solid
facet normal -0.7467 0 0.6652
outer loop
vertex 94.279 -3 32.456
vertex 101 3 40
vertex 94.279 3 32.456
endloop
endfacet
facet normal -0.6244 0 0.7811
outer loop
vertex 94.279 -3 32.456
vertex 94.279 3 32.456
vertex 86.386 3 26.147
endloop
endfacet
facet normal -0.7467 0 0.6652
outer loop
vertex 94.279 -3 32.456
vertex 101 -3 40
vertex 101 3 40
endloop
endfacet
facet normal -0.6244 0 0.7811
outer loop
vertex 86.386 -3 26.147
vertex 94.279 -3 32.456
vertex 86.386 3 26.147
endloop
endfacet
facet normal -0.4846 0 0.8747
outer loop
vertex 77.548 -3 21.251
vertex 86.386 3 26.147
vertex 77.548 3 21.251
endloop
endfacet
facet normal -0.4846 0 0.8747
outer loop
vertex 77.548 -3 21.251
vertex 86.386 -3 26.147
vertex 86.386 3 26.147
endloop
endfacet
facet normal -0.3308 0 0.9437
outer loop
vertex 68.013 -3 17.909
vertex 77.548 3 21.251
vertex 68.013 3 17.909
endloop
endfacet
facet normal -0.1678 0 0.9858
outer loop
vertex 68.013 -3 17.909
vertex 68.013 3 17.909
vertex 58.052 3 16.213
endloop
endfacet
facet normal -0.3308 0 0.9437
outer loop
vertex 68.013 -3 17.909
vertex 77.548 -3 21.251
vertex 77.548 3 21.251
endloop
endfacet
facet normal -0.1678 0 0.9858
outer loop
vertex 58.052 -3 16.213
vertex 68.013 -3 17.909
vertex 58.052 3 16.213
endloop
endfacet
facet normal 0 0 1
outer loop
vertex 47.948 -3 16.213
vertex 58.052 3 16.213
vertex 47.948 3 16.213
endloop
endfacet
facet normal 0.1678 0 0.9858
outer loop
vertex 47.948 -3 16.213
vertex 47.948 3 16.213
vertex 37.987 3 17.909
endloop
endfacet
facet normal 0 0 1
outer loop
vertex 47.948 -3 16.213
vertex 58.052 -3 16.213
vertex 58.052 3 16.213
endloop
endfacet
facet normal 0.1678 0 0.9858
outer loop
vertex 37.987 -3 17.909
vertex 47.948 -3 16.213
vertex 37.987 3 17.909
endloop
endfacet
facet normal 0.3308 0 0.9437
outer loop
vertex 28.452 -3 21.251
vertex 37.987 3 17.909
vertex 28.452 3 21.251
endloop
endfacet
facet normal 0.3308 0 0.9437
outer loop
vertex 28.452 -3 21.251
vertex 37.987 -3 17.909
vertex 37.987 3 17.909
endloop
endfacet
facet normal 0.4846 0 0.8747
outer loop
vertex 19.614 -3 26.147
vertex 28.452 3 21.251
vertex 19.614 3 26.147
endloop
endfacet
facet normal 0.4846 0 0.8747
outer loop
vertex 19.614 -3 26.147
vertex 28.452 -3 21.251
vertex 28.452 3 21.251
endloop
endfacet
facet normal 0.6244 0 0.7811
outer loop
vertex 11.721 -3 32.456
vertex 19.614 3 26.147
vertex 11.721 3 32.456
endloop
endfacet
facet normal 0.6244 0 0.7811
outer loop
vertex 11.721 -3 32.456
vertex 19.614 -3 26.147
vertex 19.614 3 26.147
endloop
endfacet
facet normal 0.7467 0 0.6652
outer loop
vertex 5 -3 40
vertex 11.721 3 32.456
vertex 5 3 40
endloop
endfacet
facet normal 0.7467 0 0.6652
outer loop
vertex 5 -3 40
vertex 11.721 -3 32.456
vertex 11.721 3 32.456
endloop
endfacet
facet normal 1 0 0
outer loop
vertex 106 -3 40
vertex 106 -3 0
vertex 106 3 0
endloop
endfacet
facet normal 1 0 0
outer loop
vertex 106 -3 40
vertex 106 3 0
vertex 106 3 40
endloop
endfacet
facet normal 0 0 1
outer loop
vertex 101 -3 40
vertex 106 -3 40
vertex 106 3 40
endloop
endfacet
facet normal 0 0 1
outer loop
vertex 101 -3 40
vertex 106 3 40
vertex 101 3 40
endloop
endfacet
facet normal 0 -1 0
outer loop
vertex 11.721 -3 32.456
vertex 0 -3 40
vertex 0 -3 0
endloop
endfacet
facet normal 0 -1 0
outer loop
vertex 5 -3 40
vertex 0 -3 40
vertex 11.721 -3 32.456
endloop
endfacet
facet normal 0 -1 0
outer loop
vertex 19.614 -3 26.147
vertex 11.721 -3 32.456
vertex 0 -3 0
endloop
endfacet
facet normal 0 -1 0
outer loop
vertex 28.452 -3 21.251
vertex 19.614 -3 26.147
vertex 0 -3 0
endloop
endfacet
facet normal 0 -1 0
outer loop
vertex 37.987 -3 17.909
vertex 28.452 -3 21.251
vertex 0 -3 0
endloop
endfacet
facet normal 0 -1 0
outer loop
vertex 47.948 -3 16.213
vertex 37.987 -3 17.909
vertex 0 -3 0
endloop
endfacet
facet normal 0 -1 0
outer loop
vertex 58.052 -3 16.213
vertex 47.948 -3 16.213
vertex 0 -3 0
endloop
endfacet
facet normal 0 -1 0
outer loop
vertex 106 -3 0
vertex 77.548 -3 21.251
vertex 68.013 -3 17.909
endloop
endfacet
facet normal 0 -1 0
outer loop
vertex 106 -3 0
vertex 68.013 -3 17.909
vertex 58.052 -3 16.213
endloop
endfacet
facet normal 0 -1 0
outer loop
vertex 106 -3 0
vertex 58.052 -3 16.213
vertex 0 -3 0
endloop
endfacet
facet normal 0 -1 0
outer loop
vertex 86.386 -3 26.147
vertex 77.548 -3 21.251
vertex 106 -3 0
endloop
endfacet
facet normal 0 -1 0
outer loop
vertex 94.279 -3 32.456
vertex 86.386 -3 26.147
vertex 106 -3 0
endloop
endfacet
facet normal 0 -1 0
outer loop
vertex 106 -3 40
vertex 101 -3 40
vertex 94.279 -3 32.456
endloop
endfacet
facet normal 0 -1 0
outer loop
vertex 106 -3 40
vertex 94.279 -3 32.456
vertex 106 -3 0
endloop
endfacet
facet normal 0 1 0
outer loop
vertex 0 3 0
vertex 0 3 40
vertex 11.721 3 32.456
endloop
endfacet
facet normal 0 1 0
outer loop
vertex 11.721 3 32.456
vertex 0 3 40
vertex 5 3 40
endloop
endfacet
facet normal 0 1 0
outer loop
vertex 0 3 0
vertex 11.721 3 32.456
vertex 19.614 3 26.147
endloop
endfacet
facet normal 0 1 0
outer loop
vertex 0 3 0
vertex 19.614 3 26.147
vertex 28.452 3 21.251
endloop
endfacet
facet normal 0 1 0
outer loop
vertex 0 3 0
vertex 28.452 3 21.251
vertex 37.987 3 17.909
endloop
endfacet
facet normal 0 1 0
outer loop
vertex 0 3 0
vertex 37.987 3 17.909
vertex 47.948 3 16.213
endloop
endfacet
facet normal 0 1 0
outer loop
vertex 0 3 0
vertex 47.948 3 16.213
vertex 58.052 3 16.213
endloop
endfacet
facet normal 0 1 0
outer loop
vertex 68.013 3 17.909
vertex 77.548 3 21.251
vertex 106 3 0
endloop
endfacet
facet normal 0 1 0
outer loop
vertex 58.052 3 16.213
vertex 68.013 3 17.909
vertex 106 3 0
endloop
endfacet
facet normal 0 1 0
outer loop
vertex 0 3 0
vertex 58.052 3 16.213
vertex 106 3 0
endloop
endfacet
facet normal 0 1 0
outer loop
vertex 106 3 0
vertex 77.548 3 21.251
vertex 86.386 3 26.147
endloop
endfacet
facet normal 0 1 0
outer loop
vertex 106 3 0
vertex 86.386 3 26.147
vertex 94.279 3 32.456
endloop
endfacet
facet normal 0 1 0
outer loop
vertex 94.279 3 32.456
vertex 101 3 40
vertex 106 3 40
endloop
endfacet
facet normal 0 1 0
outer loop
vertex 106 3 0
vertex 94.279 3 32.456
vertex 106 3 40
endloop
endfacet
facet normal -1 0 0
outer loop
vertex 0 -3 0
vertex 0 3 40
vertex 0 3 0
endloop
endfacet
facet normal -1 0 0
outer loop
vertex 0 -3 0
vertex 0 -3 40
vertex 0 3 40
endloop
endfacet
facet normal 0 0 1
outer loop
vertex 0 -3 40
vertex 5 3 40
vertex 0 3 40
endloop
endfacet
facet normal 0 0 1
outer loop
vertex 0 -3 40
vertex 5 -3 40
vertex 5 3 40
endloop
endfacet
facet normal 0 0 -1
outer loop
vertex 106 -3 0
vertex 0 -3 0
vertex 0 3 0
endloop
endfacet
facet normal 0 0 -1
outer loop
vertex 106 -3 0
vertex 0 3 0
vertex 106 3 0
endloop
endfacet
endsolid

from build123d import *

# Parameters (mm, degrees)
F1_DEPTH = 3


with BuildPart() as f1:
    # F0 (on Front) → F1 (new body, symmetric)
    with BuildSketch(Plane.XZ):
        with BuildLine():
            Line((0, 40), (0, 0))
            Line((0, 0), (106, 0))
            Line((106, 0), (106, 40))
            Line((106, 40), (101, 40))
            ThreePointArc((101, 40), (53, 16), (5, 40))
            Line((5, 40), (0, 40))
        make_face()
    extrude(amount=F1_DEPTH, both=True)


solid = f1.part
